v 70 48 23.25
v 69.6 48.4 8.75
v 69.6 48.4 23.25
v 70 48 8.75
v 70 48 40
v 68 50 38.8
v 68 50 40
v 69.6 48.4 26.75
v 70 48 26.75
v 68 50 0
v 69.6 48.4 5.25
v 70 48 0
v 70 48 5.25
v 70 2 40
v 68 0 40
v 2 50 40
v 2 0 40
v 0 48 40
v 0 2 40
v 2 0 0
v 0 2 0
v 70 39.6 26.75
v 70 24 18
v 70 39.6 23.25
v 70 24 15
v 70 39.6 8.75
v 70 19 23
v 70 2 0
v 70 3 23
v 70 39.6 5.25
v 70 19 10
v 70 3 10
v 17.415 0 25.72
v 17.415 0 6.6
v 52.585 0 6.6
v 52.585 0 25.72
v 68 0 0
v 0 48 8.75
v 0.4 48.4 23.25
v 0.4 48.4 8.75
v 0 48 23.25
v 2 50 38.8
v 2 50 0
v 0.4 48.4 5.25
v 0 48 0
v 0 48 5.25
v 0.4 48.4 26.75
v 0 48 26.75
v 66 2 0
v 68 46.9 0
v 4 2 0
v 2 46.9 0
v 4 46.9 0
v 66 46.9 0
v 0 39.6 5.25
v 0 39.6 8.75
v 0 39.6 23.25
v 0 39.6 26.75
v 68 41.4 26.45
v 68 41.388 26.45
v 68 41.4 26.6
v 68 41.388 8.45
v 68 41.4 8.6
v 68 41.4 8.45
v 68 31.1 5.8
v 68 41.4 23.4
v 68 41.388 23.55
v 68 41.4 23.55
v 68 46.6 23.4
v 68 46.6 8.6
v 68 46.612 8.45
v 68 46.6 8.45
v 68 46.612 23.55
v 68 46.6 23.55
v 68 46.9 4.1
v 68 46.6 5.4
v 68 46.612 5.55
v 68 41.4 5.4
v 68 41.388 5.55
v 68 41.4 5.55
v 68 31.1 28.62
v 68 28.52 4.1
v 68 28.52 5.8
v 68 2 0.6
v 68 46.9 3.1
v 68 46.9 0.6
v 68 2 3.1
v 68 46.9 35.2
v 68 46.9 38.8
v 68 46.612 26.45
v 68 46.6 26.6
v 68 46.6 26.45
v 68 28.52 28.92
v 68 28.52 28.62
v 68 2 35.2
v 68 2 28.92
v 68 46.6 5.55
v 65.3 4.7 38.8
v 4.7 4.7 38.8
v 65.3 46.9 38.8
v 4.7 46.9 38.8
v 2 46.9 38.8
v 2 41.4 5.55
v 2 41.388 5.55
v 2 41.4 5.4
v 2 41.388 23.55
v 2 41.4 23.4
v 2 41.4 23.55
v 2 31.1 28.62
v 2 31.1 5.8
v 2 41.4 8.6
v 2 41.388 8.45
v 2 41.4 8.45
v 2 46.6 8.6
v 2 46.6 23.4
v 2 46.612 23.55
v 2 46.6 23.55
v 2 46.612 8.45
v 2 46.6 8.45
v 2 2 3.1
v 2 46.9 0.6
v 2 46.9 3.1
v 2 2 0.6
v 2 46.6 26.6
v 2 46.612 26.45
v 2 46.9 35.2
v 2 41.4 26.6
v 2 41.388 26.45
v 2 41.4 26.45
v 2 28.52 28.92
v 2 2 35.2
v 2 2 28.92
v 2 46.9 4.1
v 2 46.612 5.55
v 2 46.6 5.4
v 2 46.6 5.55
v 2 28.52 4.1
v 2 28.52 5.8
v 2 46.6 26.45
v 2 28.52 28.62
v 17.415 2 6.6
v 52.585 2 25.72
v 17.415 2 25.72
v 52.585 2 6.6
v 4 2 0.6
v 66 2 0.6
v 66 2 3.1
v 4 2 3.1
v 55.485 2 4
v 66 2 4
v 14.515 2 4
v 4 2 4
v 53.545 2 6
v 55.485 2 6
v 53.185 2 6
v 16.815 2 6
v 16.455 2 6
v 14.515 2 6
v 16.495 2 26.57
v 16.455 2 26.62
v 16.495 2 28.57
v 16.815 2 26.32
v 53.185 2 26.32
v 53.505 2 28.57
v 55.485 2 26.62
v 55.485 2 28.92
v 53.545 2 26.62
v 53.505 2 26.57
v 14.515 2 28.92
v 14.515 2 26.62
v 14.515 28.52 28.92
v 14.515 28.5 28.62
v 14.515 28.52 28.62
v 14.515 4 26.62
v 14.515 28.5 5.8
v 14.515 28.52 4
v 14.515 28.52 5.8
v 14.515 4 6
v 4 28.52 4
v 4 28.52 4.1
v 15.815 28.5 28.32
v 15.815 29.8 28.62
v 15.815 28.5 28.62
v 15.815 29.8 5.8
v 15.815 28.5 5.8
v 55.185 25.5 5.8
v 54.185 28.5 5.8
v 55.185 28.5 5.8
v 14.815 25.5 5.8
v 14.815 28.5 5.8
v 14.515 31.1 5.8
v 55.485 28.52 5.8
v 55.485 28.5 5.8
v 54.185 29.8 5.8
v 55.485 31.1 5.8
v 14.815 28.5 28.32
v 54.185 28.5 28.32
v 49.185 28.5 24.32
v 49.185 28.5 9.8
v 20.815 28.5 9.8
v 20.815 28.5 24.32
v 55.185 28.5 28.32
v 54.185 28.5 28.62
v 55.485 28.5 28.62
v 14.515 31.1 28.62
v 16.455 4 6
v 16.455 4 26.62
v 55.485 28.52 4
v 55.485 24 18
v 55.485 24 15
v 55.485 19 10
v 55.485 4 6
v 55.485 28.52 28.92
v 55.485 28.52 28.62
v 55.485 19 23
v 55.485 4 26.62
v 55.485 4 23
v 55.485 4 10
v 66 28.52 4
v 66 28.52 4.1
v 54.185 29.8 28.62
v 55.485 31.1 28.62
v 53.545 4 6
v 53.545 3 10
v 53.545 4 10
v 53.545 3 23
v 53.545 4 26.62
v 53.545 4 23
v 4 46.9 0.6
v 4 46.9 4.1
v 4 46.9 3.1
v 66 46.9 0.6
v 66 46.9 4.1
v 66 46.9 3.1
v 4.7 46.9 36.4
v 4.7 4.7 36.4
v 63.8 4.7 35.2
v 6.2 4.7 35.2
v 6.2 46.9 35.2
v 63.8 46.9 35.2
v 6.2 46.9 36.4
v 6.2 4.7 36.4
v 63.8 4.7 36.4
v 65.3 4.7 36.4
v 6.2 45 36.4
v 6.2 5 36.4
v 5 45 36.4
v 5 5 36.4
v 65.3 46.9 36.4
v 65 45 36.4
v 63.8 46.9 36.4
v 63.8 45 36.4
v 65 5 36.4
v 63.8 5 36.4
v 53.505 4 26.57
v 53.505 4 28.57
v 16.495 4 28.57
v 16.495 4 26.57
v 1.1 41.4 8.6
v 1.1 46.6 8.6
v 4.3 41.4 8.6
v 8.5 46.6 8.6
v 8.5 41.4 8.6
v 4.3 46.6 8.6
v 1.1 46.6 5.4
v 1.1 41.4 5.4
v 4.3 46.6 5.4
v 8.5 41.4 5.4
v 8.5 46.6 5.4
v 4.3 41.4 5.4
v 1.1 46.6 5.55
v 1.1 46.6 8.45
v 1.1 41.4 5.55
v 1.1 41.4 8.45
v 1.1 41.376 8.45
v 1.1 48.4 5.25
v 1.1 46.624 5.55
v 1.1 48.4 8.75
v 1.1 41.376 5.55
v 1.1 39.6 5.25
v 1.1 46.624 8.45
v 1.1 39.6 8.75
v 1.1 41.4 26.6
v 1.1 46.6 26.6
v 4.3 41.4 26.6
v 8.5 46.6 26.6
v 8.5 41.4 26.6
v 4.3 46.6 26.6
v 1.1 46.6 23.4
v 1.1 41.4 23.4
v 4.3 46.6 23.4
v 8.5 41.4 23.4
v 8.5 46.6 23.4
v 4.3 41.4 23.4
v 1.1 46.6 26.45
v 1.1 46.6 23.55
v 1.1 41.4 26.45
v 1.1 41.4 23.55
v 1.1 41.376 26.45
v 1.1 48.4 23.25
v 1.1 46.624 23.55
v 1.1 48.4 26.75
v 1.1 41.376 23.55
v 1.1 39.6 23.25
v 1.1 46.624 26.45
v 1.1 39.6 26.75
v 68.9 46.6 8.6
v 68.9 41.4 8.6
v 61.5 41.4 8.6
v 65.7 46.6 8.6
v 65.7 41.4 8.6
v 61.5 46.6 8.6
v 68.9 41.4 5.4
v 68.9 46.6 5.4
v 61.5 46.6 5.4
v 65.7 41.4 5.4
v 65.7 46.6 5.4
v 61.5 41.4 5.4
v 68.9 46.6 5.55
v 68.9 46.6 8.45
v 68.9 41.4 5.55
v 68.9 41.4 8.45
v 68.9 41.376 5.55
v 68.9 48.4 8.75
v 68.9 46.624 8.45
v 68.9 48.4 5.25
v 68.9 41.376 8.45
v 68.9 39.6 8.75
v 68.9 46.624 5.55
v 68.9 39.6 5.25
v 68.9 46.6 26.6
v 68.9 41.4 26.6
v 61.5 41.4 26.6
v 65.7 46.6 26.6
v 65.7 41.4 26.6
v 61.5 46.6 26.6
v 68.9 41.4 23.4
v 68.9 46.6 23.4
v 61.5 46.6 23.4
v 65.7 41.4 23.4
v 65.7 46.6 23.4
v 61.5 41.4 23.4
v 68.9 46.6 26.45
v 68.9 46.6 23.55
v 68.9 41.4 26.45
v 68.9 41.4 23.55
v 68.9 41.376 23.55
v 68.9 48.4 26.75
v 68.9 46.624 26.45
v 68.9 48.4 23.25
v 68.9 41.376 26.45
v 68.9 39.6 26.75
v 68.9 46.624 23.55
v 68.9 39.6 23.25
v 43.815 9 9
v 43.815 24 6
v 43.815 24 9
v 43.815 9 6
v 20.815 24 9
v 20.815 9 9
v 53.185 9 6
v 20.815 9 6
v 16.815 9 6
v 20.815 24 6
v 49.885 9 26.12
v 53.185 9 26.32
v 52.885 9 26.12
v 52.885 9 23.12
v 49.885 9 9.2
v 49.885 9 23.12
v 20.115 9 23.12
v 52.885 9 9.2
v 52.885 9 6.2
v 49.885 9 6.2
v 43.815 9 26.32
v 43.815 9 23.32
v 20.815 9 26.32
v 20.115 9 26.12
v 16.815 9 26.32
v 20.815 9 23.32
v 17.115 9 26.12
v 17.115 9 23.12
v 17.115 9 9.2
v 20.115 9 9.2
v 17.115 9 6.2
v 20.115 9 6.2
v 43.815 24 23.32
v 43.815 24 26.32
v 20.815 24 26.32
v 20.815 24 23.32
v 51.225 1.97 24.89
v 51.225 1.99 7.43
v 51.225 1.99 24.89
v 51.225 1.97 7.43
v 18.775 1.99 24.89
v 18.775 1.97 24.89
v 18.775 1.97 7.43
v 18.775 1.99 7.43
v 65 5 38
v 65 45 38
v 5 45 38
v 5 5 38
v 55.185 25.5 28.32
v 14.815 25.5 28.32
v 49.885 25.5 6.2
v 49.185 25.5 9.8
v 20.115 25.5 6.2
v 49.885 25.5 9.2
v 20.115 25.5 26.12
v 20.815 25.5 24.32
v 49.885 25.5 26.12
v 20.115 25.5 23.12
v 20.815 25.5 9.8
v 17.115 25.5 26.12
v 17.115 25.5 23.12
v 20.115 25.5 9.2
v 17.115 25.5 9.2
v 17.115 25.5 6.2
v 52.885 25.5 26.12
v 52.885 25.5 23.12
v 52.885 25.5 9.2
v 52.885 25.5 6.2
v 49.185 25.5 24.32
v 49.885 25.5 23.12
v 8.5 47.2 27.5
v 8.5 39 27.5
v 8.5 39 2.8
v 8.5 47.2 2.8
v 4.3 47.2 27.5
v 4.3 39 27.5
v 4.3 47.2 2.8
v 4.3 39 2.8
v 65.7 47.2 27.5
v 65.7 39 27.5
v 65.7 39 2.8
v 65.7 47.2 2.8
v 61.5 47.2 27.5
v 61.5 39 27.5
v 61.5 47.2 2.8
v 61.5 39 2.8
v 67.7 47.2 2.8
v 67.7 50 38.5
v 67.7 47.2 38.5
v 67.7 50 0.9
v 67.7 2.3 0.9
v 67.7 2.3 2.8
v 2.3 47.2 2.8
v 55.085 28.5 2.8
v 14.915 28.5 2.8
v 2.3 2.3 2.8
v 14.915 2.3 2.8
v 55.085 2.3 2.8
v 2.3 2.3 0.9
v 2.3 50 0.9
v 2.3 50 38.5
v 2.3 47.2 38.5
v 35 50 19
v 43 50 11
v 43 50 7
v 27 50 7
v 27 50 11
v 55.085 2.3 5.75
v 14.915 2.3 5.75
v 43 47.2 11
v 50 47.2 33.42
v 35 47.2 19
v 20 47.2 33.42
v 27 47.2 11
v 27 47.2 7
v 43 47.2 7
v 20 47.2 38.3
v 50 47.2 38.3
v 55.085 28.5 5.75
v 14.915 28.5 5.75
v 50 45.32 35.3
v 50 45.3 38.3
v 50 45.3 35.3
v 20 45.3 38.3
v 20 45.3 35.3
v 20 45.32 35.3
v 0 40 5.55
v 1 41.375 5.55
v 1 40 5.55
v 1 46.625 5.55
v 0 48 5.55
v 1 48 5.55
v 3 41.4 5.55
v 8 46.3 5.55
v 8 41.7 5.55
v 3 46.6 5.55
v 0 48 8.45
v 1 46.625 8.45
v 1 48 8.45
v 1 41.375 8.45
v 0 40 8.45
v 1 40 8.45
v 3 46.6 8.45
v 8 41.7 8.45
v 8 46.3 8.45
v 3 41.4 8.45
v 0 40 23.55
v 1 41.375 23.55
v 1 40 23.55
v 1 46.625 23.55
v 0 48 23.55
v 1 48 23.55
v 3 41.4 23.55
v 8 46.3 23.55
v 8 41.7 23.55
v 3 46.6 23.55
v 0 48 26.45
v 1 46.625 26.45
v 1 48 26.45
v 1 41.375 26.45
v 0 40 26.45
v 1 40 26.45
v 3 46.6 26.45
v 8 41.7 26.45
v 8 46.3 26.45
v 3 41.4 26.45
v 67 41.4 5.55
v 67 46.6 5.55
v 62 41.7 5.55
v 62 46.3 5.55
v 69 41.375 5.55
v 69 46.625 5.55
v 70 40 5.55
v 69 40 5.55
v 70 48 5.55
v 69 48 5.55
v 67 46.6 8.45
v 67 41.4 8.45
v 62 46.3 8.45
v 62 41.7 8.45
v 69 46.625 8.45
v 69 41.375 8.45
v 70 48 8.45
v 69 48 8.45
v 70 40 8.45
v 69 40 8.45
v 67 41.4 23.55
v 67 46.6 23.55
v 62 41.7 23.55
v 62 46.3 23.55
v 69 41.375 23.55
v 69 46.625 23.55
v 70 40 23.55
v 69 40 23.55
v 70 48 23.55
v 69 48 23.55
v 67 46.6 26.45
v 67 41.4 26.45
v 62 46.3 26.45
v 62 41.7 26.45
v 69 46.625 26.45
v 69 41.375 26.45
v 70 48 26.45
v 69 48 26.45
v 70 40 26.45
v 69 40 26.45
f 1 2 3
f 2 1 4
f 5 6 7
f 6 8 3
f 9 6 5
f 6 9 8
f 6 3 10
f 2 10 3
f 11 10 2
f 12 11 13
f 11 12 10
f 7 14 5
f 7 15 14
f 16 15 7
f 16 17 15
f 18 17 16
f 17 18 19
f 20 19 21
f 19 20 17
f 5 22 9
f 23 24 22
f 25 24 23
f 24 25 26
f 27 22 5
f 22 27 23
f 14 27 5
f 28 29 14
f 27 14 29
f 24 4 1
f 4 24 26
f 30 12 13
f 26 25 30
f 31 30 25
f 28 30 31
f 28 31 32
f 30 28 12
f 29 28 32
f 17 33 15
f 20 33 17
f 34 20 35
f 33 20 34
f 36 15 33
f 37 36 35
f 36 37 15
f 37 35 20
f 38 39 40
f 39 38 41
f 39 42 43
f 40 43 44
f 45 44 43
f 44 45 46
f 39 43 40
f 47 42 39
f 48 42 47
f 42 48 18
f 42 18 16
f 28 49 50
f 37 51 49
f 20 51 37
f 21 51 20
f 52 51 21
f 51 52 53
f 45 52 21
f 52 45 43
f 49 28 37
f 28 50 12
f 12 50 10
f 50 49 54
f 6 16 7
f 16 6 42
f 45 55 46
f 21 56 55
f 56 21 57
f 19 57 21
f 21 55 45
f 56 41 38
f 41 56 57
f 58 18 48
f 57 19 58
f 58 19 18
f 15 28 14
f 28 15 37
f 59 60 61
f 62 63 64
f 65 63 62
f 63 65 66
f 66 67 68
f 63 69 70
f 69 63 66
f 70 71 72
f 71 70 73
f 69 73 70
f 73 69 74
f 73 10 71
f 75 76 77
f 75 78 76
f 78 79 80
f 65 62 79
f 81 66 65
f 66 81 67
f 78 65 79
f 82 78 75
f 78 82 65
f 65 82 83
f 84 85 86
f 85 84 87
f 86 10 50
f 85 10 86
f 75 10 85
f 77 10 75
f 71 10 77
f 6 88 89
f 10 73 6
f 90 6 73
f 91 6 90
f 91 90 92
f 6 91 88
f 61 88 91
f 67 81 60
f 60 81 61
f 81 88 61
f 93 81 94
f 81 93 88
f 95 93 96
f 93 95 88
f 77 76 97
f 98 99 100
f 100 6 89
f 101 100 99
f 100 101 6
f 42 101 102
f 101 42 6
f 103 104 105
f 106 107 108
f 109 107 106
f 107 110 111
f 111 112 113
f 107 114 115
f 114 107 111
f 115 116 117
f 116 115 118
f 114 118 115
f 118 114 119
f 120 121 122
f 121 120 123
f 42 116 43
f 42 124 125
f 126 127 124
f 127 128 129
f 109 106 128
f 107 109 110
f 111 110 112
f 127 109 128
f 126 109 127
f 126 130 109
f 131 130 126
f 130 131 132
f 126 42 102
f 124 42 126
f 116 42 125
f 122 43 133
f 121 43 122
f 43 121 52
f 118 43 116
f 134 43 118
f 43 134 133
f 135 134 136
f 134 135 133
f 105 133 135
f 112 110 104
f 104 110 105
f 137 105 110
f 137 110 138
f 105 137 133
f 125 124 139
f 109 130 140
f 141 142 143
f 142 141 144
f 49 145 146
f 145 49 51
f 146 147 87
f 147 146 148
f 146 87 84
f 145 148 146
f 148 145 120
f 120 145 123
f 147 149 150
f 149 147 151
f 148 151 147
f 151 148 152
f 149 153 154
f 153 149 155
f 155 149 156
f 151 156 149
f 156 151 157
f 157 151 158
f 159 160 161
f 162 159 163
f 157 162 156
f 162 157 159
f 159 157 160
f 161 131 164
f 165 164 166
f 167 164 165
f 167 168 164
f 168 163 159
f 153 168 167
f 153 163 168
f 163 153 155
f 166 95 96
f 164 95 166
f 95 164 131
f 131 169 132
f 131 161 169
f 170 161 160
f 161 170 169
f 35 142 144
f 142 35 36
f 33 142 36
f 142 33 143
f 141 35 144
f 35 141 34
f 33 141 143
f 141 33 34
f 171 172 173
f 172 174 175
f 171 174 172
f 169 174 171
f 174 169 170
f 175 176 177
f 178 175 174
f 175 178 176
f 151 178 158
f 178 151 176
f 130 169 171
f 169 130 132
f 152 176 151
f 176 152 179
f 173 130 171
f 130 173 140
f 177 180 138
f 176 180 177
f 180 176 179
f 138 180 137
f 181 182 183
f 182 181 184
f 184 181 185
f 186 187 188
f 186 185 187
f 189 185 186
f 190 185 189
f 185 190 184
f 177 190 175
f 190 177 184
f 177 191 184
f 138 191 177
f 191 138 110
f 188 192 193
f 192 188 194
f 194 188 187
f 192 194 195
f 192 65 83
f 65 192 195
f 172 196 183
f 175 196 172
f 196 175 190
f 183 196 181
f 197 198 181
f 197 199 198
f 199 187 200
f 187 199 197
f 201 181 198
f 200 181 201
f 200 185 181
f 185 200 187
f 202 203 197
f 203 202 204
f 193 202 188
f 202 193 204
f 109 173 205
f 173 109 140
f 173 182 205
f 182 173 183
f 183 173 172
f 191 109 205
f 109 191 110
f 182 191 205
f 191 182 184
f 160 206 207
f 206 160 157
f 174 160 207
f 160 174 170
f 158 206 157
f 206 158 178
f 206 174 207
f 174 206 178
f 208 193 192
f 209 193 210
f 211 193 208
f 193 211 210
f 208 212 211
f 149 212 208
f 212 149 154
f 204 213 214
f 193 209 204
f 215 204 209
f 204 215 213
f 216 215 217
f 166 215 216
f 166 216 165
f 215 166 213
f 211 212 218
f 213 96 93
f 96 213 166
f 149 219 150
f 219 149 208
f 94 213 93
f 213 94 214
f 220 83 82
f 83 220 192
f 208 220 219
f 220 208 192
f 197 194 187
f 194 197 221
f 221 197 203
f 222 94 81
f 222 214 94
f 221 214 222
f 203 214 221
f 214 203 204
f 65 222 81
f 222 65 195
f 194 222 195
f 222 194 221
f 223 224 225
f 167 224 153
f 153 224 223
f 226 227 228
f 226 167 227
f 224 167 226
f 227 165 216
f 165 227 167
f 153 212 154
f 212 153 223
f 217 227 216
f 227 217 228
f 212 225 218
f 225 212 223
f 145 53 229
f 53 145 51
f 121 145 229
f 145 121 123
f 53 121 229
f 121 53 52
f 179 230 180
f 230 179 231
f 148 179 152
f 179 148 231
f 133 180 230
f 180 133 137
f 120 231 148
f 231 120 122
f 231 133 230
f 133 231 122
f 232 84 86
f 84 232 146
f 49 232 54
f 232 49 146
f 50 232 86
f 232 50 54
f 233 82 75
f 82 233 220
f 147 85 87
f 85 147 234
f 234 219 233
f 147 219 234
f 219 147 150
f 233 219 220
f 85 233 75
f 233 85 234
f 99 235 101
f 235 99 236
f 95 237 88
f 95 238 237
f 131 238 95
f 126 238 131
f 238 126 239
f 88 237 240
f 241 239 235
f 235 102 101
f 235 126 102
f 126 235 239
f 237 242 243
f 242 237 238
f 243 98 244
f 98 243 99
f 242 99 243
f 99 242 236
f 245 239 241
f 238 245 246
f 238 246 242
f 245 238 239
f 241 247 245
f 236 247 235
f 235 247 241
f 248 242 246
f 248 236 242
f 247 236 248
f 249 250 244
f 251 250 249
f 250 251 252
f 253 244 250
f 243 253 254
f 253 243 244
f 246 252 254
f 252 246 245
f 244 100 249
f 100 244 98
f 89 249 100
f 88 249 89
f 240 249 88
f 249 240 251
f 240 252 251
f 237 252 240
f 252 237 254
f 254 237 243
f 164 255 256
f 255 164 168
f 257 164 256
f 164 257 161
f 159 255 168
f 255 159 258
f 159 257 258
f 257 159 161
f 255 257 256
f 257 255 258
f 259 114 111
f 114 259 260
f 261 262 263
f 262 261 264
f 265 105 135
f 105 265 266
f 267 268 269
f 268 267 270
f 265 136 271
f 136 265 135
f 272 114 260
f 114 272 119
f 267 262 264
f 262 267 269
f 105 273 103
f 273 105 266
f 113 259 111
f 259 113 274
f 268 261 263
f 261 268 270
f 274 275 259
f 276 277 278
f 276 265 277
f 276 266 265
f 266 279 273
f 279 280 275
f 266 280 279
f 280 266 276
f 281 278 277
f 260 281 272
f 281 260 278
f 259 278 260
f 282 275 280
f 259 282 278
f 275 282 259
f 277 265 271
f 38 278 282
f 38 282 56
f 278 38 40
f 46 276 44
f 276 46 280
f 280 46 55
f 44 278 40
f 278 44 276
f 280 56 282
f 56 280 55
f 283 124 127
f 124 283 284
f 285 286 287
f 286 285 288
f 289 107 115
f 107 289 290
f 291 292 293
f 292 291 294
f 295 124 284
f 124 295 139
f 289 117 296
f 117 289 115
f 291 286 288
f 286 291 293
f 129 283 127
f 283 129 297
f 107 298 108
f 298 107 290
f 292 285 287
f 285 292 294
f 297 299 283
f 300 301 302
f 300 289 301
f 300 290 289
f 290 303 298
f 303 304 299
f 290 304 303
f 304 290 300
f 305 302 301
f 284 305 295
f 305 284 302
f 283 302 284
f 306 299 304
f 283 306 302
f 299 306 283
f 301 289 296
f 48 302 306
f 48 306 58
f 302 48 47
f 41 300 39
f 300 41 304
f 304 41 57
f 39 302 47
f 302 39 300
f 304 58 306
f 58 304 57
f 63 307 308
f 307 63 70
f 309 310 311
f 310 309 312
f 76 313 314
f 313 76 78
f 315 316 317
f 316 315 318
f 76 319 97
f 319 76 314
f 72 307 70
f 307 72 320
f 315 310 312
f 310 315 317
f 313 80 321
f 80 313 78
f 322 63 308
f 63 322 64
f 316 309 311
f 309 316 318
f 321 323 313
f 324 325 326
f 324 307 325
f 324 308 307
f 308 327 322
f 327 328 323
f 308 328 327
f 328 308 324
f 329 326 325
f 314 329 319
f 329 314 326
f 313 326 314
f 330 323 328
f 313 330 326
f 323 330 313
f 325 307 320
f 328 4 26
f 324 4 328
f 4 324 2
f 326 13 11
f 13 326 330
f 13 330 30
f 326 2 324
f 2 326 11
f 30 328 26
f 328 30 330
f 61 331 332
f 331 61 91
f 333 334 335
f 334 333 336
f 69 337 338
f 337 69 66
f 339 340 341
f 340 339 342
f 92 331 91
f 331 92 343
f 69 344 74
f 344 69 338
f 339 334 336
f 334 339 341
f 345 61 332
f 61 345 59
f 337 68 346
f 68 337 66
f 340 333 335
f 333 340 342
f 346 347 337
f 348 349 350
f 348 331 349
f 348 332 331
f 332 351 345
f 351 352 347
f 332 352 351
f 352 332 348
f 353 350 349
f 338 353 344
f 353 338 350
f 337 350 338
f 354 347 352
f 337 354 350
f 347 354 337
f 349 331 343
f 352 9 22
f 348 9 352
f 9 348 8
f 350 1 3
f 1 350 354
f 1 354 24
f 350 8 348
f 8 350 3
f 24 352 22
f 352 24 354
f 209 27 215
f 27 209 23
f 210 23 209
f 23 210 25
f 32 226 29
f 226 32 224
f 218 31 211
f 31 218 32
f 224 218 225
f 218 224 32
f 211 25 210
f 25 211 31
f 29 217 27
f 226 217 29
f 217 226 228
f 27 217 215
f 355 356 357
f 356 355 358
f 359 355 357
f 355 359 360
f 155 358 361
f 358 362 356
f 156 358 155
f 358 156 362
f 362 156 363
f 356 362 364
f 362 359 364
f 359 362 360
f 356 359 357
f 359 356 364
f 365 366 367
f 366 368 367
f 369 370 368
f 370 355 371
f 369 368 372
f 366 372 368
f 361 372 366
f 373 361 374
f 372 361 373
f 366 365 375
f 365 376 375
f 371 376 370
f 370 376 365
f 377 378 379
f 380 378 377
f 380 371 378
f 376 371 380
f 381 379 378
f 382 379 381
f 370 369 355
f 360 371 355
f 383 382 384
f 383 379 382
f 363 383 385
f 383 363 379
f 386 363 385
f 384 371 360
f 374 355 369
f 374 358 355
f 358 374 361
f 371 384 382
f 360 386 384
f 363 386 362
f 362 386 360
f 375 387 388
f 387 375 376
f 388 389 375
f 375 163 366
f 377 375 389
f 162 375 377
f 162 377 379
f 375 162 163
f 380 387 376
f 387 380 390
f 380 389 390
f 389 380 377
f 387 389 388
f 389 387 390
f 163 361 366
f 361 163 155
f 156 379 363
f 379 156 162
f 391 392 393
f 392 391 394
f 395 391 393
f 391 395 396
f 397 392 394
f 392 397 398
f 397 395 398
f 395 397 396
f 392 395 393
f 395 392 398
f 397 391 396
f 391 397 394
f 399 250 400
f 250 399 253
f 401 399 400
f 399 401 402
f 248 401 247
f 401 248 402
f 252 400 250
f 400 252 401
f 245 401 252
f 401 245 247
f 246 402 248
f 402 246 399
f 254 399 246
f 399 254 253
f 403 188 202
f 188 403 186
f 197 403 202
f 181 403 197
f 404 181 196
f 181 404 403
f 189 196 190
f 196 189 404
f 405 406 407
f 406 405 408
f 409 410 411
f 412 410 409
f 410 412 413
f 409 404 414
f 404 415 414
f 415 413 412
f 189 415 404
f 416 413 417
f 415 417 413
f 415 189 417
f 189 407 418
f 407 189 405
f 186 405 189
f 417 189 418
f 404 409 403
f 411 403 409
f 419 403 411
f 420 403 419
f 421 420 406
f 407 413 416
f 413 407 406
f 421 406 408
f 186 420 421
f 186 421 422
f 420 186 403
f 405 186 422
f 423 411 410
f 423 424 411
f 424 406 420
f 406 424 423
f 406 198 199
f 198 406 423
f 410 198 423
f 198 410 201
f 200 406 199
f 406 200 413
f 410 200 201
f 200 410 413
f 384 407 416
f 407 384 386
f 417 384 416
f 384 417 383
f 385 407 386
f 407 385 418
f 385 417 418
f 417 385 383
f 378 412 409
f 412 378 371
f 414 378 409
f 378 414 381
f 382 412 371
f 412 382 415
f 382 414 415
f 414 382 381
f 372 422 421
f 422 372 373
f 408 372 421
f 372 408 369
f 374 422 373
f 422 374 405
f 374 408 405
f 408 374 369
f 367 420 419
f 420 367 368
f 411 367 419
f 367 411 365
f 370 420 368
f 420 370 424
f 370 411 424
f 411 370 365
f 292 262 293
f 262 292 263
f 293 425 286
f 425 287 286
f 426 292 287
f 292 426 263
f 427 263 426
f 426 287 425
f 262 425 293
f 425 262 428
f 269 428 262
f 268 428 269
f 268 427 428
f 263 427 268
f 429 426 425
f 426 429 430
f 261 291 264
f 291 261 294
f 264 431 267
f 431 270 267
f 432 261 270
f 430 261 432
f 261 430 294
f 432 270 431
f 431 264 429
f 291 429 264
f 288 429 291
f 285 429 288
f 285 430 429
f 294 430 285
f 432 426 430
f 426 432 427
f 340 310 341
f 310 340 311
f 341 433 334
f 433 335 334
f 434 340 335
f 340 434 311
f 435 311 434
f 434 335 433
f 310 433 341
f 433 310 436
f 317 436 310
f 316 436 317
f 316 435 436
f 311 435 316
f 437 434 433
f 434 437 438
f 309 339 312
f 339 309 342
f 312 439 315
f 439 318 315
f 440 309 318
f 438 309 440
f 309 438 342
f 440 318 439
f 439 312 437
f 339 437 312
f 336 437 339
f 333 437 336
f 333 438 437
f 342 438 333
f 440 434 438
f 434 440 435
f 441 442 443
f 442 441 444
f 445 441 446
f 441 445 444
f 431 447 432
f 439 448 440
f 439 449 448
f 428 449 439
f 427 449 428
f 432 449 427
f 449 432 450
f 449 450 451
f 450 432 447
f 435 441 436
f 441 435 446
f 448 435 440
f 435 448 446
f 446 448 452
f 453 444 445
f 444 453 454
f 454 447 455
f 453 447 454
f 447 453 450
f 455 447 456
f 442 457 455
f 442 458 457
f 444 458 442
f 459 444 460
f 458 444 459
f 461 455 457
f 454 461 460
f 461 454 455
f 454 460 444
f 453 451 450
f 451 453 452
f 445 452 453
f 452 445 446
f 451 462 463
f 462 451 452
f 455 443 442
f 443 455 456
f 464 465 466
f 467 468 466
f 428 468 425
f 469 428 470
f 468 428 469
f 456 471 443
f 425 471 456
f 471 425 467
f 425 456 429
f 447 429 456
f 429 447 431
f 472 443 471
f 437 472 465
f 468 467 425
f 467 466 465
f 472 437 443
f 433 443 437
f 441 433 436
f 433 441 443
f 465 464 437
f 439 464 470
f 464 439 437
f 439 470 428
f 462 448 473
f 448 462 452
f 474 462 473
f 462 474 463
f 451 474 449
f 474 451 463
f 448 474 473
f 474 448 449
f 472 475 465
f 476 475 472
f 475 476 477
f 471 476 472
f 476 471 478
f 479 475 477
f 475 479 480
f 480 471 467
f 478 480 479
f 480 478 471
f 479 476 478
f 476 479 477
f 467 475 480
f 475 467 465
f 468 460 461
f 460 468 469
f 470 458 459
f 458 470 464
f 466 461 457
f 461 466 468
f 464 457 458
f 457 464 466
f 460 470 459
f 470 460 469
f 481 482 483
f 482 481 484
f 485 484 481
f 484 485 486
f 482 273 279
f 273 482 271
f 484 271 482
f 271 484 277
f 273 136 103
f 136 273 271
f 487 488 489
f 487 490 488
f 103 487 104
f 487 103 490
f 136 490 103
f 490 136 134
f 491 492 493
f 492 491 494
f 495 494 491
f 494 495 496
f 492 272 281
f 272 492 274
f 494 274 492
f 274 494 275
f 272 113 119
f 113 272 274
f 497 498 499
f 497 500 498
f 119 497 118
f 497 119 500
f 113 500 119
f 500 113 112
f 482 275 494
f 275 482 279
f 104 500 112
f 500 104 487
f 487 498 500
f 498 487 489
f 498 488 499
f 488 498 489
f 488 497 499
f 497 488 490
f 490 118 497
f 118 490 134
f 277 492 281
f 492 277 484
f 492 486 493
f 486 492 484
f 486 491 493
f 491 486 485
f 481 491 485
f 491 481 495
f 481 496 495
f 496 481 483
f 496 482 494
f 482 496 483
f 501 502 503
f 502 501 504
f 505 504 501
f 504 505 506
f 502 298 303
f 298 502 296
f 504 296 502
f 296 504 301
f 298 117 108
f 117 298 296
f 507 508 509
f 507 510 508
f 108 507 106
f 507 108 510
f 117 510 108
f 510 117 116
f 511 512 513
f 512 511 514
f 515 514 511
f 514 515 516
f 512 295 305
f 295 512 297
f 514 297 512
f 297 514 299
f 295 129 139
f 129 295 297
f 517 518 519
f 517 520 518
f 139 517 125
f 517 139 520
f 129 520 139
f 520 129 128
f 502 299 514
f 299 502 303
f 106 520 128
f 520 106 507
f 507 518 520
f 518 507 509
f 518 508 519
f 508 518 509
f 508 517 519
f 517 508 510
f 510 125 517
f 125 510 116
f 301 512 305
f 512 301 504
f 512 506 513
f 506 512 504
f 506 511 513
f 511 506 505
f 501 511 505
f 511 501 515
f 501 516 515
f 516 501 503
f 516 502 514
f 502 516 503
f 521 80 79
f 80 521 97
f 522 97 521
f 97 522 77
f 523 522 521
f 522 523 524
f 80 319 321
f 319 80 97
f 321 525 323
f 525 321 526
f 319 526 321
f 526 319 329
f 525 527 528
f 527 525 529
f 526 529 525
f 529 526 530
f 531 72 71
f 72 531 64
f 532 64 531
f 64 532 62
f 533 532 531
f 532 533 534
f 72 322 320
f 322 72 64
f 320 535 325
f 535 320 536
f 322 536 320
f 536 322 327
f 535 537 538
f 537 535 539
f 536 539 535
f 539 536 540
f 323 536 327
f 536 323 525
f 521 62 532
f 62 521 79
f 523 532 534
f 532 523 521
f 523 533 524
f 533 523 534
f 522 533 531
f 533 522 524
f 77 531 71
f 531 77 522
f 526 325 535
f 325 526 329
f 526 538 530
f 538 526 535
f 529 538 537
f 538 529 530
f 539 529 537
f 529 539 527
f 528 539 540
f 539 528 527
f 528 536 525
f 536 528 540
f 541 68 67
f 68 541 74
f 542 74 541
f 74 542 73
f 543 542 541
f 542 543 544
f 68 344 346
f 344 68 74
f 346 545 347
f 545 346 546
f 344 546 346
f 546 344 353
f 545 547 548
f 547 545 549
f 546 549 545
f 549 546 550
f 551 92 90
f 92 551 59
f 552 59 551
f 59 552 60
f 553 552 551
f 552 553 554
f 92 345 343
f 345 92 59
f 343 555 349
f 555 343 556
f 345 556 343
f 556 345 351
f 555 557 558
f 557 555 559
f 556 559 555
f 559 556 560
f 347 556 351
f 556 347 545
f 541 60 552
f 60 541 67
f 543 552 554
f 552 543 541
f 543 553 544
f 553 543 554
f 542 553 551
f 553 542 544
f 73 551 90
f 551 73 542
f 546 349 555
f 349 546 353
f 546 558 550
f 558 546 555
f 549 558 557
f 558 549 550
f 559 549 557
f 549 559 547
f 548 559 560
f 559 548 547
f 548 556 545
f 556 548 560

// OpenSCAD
// Office NFC jukebox, Waveshare ESP32-S3-LCD-1.47B-M + RC522.
// Units mm. X left/right, Y front/rear, Z up. USB faces right.
// Board footprint 36.37 x 20.32 from manufacturer drawing.
// Module thickness and connector envelopes are provisional, not measured.
part="assembly";
module_depth=7; // Front of display to rear PCB, excluding pins/connectors.
key_fit=0;
$fn=32;
W=70; D=50; H=40; wall=2; eps=.02;
mw=36.37; mh=20.32; mx=(W-mw)/2; mz=6;
frame_x=mx-2; frame_z=5.8; frame_w=mw+4; frame_h=22.52;
rc_x=5; rc_y=5; rc_z=36.4;
module box(x,y,z,dx,dy,dz){translate([x,y,z])cube([dx,dy,dz]);}

module usb_clearance(){
  // A recessed USB socket: opening admits the plug housing, not only its tip.
  translate([mx+mw-3,0,0])rotate([90,0,90])linear_extrude(height=W-mx-mw+3+eps)
    polygon([[3,10],[19,10],[24,15],[24,18],[19,23],[3,23]]);
}
module key_holes(){
  for(right=[false,true])translate([right?W:0,0,0])scale([right?-1:1,1,1])
    for(z=[7,25]){
      box(-eps,41.4,z-1.6,9.4,5.2,3.2);
      box(-eps,39.6,z-1.75,1.12,8.8,3.5);
    }
}
module body(){difference(){
  union(){
    difference(){
      linear_extrude(height=H)polygon([[2,0],[W-2,0],[W,2],[W,D-2],
        [W-2,D],[2,D],[0,D-2],[0,2]]);
      box(2,2,-eps,W-4,D,H-1.2+eps);
      // Provisional centered window; 0.6-mm bezel overlap on each board edge.
      box(mx+.6,-eps,mz+.6,mw-1.2,2+2*eps,mh-1.2);
    }
    // Continuous side cheeks support the board and the removable pressure frame.
    for(right=[false,true])translate([right?W:0,0,0])scale([right?-1:1,1,1]){
      box(2-eps,2-eps,4,frame_x-.3-2+eps,26.54,24.92);
      // Rear stop: 1.3 mm local lip, followed by a supporting 45-degree ramp.
      translate([0,0,frame_z])linear_extrude(height=frame_h+.3)
        polygon([[1.98,28.5],[frame_x+1,28.5],[frame_x+1,29.8],
                 [frame_x-.3,31.1],[1.98,31.1]]);
      // Board edge guide grows from the front bezel; outside the board footprint.
      box(frame_x-.35,1.98,mz,1.99,2.02,mh+.3);
    }
    // Broad top stop, supported by the front wall.
    box(mx-.32,1.98,mz+mh+.25,mw+.64,2.02,2);
    // Floor tracks.
    for(x=[1.98,66]){
      box(x,1.98,0,2.02,44.92,.6);
      box(x,1.98,3.1,2.02,44.92,1);
    }
    // RC522 rails: 1.6-mm PCB, 0.8-mm clearance to the 1.2-mm roof.
    for(right=[false,true])translate([right?W:0,0,0])scale([right?-1:1,1,1]){
      box(1.98,4.7,35.2,2.72,42.2,3.62);
      box(1.98,4.7,35.2,4.22,42.2,1.2);
    }
    box(1.98,1.98,35.2,66.04,2.72,3.62);
  }
  usb_clearance();
  key_holes();
}}
module retainer(){
  // One removable frame; its rear face seats against the body's rear stops.
  // Four columns contact only corner areas, leaving headers and USB clear.
  union(){
    difference(){
      box(frame_x,25.5,frame_z,frame_w,3,frame_h);
      box(frame_x+6,25.4,frame_z+4,frame_w-12,3.2,frame_h-8);
    }
    for(x=[mx+.3,mx+mw-3.3])for(z=[mz+.2,mz+mh-3.2])
      box(x,2+module_depth,z,3,25.52-(2+module_depth),3);
  }
}
module drawer(){difference(){
  union(){
    box(2.3,2.3,.9,W-4.6,D-2.3,1.9);
    box(2.3,47.2,.9,W-4.6,2.8,37.6);
    // Four key seats below the RC522 component clearance zone.
    for(x=[4.3,W-8.5])box(x,39,2.7,4.2,8.22,24.8);
    // Full-width cradle supports board and retainer from below.
    box(frame_x+.1,2.3,2.7,frame_w-.2,26.2,3.05);
    // RFID end stop plus self-supporting triangular brace.
    box(20,45.3,35.3,30,1.92,3);
    translate([20,47.2,33.4])rotate([90,0,90])linear_extrude(height=30)
      polygon([[eps,0],[eps,1.92],[-1.9,1.92]]);
  }
  key_holes();
  translate([27,50.1,7])rotate([90,0,0])linear_extrude(height=3)
    polygon([[0,0],[16,0],[16,4],[8,12],[0,4]]);
}}
module key(){linear_extrude(height=2.9)polygon([[0,-4],[1,-4],
  [1,-2.625-key_fit/2],[3,-2.6-key_fit/2],[8,-2.3],[8,2.3],
  [3,2.6+key_fit/2],[1,2.625+key_fit/2],[1,4],[0,4]]);}
module keys(){for(right=[false,true])translate([right?W:0,0,0])scale([right?-1:1,1,1])
  for(z=[7,25])translate([0,44,z-1.45])key();}
module hardware(){
  color([.1,.18,.22])box(mx,2,mz,mw,module_depth,mh);
  color([.08,.65,.64])box(mx+1.96,1.97,mz+1.43,32.45,.02,17.46);
  color([.1,.35,.65])box(5,5,rc_z,60,40,1.6);
  // Conservative illustrative connector/wire envelopes, not measured components.
  color([.5,.5,.5,.3])for(z=[mz,mz+mh-3])box(mx+4,2+module_depth,z,23,15,3);
}
module body_print(){translate([0,H,0])rotate([90,0,0])body();}
module retainer_print(){translate([-frame_x,-frame_z,28.5])rotate([-90,0,0])retainer();}
module keys_print(){for(i=[0:3])translate([i*11,4,0])key();}
if(part=="body")body_print();
else if(part=="drawer")translate([0,0,-.9])drawer();
else if(part=="retainer")retainer_print();
else if(part=="keys")keys_print();
else if(part=="body_assembly")body();
else if(part=="drawer_assembly")drawer();
else if(part=="retainer_assembly")retainer();
else if(part=="plate"){
  body_print();translate([80,0,-.9])drawer();
  translate([0,55,0])retainer_print();translate([80,55,0])keys_print();
}else if(part=="exploded"){
  color([.76,.8,.83,.35])body();hardware();
  color([.95,.65,.1])translate([0,8,-8])retainer();
  color([.95,.5,.2])translate([0,35,-12])drawer();
  color([.1,.65,.7])keys();
}else{
  color([.76,.8,.83,.4])body();hardware();
  color([.95,.65,.1])retainer();color([.3,.36,.42])drawer();
  color([.1,.65,.7])keys();
}
